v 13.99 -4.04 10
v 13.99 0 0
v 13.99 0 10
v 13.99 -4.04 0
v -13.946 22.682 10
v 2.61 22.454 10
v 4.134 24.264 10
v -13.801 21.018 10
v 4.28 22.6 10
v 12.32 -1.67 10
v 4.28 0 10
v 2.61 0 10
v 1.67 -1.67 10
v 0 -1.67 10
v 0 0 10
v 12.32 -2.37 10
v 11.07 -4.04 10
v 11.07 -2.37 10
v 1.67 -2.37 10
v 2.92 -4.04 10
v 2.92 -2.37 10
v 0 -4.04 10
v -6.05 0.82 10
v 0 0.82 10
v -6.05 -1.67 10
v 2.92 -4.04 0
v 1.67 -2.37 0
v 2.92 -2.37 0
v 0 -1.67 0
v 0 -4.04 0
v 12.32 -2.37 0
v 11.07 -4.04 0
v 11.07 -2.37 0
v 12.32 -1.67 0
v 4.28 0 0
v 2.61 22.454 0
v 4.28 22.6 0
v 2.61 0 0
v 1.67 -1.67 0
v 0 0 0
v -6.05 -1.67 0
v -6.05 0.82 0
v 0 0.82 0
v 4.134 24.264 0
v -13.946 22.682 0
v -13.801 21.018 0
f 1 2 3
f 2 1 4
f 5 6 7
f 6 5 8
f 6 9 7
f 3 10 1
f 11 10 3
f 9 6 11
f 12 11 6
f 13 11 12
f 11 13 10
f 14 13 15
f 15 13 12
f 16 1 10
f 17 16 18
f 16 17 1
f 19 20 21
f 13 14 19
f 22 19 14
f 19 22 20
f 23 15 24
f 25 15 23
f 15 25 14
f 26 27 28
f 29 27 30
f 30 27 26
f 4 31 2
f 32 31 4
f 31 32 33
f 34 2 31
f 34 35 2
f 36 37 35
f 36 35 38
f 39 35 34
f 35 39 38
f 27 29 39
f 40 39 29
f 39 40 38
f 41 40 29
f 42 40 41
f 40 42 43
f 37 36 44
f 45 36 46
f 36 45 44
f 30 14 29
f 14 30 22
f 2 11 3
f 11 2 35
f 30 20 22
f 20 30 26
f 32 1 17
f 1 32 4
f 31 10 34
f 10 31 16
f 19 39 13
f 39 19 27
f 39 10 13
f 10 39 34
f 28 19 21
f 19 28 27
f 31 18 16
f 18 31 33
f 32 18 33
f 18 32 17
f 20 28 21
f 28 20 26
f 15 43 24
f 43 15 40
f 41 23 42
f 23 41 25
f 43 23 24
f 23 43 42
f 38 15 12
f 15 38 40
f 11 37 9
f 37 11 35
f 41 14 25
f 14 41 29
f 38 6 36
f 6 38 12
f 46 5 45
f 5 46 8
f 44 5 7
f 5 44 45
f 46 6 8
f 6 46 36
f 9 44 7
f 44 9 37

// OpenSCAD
slop = .2;
thin_wall_thickness = 1.67;

strip_width = 10.25 + slop*2;
strip_thickness = .50 + slop;
strip_margin = (10.25-7.75)/2;

bezel_width = 6.25 - slop;
frame_width = 2.41 + slop;
frame_thickness = 22.4 + slop;
clip_over = max(.60, 2.49 - thin_wall_thickness);

back_length = bezel_width*3;
preload_degrees = 5;

thickness = 10;

clip_width = bezel_width + frame_width + thin_wall_thickness;

translate([-bezel_width, 0,0]) cube([bezel_width, clip_over, thickness]);
translate([-bezel_width, -thin_wall_thickness, 0]) cube([clip_width, thin_wall_thickness, thickness]);
translate([frame_width,0,0]) cube([thin_wall_thickness, frame_thickness, thickness]);
translate([-back_length+frame_width+thin_wall_thickness, frame_thickness, 0])
    translate([back_length,0,0])
    rotate([0,0,preload_degrees])
    translate([-back_length,0,0])
    cube([back_length, thin_wall_thickness, thickness]);

translate([0,-(strip_thickness+2*thin_wall_thickness),0]){
    difference(){
        cube([strip_width+2*thin_wall_thickness, strip_thickness+2*thin_wall_thickness, thickness]);
        translate([thin_wall_thickness, thin_wall_thickness, 0])
            cube([strip_width, strip_thickness, thickness]);
        translate([thin_wall_thickness + strip_margin,0,0])
            cube([strip_width - 2*strip_margin, thin_wall_thickness, thickness]);
    }
}
